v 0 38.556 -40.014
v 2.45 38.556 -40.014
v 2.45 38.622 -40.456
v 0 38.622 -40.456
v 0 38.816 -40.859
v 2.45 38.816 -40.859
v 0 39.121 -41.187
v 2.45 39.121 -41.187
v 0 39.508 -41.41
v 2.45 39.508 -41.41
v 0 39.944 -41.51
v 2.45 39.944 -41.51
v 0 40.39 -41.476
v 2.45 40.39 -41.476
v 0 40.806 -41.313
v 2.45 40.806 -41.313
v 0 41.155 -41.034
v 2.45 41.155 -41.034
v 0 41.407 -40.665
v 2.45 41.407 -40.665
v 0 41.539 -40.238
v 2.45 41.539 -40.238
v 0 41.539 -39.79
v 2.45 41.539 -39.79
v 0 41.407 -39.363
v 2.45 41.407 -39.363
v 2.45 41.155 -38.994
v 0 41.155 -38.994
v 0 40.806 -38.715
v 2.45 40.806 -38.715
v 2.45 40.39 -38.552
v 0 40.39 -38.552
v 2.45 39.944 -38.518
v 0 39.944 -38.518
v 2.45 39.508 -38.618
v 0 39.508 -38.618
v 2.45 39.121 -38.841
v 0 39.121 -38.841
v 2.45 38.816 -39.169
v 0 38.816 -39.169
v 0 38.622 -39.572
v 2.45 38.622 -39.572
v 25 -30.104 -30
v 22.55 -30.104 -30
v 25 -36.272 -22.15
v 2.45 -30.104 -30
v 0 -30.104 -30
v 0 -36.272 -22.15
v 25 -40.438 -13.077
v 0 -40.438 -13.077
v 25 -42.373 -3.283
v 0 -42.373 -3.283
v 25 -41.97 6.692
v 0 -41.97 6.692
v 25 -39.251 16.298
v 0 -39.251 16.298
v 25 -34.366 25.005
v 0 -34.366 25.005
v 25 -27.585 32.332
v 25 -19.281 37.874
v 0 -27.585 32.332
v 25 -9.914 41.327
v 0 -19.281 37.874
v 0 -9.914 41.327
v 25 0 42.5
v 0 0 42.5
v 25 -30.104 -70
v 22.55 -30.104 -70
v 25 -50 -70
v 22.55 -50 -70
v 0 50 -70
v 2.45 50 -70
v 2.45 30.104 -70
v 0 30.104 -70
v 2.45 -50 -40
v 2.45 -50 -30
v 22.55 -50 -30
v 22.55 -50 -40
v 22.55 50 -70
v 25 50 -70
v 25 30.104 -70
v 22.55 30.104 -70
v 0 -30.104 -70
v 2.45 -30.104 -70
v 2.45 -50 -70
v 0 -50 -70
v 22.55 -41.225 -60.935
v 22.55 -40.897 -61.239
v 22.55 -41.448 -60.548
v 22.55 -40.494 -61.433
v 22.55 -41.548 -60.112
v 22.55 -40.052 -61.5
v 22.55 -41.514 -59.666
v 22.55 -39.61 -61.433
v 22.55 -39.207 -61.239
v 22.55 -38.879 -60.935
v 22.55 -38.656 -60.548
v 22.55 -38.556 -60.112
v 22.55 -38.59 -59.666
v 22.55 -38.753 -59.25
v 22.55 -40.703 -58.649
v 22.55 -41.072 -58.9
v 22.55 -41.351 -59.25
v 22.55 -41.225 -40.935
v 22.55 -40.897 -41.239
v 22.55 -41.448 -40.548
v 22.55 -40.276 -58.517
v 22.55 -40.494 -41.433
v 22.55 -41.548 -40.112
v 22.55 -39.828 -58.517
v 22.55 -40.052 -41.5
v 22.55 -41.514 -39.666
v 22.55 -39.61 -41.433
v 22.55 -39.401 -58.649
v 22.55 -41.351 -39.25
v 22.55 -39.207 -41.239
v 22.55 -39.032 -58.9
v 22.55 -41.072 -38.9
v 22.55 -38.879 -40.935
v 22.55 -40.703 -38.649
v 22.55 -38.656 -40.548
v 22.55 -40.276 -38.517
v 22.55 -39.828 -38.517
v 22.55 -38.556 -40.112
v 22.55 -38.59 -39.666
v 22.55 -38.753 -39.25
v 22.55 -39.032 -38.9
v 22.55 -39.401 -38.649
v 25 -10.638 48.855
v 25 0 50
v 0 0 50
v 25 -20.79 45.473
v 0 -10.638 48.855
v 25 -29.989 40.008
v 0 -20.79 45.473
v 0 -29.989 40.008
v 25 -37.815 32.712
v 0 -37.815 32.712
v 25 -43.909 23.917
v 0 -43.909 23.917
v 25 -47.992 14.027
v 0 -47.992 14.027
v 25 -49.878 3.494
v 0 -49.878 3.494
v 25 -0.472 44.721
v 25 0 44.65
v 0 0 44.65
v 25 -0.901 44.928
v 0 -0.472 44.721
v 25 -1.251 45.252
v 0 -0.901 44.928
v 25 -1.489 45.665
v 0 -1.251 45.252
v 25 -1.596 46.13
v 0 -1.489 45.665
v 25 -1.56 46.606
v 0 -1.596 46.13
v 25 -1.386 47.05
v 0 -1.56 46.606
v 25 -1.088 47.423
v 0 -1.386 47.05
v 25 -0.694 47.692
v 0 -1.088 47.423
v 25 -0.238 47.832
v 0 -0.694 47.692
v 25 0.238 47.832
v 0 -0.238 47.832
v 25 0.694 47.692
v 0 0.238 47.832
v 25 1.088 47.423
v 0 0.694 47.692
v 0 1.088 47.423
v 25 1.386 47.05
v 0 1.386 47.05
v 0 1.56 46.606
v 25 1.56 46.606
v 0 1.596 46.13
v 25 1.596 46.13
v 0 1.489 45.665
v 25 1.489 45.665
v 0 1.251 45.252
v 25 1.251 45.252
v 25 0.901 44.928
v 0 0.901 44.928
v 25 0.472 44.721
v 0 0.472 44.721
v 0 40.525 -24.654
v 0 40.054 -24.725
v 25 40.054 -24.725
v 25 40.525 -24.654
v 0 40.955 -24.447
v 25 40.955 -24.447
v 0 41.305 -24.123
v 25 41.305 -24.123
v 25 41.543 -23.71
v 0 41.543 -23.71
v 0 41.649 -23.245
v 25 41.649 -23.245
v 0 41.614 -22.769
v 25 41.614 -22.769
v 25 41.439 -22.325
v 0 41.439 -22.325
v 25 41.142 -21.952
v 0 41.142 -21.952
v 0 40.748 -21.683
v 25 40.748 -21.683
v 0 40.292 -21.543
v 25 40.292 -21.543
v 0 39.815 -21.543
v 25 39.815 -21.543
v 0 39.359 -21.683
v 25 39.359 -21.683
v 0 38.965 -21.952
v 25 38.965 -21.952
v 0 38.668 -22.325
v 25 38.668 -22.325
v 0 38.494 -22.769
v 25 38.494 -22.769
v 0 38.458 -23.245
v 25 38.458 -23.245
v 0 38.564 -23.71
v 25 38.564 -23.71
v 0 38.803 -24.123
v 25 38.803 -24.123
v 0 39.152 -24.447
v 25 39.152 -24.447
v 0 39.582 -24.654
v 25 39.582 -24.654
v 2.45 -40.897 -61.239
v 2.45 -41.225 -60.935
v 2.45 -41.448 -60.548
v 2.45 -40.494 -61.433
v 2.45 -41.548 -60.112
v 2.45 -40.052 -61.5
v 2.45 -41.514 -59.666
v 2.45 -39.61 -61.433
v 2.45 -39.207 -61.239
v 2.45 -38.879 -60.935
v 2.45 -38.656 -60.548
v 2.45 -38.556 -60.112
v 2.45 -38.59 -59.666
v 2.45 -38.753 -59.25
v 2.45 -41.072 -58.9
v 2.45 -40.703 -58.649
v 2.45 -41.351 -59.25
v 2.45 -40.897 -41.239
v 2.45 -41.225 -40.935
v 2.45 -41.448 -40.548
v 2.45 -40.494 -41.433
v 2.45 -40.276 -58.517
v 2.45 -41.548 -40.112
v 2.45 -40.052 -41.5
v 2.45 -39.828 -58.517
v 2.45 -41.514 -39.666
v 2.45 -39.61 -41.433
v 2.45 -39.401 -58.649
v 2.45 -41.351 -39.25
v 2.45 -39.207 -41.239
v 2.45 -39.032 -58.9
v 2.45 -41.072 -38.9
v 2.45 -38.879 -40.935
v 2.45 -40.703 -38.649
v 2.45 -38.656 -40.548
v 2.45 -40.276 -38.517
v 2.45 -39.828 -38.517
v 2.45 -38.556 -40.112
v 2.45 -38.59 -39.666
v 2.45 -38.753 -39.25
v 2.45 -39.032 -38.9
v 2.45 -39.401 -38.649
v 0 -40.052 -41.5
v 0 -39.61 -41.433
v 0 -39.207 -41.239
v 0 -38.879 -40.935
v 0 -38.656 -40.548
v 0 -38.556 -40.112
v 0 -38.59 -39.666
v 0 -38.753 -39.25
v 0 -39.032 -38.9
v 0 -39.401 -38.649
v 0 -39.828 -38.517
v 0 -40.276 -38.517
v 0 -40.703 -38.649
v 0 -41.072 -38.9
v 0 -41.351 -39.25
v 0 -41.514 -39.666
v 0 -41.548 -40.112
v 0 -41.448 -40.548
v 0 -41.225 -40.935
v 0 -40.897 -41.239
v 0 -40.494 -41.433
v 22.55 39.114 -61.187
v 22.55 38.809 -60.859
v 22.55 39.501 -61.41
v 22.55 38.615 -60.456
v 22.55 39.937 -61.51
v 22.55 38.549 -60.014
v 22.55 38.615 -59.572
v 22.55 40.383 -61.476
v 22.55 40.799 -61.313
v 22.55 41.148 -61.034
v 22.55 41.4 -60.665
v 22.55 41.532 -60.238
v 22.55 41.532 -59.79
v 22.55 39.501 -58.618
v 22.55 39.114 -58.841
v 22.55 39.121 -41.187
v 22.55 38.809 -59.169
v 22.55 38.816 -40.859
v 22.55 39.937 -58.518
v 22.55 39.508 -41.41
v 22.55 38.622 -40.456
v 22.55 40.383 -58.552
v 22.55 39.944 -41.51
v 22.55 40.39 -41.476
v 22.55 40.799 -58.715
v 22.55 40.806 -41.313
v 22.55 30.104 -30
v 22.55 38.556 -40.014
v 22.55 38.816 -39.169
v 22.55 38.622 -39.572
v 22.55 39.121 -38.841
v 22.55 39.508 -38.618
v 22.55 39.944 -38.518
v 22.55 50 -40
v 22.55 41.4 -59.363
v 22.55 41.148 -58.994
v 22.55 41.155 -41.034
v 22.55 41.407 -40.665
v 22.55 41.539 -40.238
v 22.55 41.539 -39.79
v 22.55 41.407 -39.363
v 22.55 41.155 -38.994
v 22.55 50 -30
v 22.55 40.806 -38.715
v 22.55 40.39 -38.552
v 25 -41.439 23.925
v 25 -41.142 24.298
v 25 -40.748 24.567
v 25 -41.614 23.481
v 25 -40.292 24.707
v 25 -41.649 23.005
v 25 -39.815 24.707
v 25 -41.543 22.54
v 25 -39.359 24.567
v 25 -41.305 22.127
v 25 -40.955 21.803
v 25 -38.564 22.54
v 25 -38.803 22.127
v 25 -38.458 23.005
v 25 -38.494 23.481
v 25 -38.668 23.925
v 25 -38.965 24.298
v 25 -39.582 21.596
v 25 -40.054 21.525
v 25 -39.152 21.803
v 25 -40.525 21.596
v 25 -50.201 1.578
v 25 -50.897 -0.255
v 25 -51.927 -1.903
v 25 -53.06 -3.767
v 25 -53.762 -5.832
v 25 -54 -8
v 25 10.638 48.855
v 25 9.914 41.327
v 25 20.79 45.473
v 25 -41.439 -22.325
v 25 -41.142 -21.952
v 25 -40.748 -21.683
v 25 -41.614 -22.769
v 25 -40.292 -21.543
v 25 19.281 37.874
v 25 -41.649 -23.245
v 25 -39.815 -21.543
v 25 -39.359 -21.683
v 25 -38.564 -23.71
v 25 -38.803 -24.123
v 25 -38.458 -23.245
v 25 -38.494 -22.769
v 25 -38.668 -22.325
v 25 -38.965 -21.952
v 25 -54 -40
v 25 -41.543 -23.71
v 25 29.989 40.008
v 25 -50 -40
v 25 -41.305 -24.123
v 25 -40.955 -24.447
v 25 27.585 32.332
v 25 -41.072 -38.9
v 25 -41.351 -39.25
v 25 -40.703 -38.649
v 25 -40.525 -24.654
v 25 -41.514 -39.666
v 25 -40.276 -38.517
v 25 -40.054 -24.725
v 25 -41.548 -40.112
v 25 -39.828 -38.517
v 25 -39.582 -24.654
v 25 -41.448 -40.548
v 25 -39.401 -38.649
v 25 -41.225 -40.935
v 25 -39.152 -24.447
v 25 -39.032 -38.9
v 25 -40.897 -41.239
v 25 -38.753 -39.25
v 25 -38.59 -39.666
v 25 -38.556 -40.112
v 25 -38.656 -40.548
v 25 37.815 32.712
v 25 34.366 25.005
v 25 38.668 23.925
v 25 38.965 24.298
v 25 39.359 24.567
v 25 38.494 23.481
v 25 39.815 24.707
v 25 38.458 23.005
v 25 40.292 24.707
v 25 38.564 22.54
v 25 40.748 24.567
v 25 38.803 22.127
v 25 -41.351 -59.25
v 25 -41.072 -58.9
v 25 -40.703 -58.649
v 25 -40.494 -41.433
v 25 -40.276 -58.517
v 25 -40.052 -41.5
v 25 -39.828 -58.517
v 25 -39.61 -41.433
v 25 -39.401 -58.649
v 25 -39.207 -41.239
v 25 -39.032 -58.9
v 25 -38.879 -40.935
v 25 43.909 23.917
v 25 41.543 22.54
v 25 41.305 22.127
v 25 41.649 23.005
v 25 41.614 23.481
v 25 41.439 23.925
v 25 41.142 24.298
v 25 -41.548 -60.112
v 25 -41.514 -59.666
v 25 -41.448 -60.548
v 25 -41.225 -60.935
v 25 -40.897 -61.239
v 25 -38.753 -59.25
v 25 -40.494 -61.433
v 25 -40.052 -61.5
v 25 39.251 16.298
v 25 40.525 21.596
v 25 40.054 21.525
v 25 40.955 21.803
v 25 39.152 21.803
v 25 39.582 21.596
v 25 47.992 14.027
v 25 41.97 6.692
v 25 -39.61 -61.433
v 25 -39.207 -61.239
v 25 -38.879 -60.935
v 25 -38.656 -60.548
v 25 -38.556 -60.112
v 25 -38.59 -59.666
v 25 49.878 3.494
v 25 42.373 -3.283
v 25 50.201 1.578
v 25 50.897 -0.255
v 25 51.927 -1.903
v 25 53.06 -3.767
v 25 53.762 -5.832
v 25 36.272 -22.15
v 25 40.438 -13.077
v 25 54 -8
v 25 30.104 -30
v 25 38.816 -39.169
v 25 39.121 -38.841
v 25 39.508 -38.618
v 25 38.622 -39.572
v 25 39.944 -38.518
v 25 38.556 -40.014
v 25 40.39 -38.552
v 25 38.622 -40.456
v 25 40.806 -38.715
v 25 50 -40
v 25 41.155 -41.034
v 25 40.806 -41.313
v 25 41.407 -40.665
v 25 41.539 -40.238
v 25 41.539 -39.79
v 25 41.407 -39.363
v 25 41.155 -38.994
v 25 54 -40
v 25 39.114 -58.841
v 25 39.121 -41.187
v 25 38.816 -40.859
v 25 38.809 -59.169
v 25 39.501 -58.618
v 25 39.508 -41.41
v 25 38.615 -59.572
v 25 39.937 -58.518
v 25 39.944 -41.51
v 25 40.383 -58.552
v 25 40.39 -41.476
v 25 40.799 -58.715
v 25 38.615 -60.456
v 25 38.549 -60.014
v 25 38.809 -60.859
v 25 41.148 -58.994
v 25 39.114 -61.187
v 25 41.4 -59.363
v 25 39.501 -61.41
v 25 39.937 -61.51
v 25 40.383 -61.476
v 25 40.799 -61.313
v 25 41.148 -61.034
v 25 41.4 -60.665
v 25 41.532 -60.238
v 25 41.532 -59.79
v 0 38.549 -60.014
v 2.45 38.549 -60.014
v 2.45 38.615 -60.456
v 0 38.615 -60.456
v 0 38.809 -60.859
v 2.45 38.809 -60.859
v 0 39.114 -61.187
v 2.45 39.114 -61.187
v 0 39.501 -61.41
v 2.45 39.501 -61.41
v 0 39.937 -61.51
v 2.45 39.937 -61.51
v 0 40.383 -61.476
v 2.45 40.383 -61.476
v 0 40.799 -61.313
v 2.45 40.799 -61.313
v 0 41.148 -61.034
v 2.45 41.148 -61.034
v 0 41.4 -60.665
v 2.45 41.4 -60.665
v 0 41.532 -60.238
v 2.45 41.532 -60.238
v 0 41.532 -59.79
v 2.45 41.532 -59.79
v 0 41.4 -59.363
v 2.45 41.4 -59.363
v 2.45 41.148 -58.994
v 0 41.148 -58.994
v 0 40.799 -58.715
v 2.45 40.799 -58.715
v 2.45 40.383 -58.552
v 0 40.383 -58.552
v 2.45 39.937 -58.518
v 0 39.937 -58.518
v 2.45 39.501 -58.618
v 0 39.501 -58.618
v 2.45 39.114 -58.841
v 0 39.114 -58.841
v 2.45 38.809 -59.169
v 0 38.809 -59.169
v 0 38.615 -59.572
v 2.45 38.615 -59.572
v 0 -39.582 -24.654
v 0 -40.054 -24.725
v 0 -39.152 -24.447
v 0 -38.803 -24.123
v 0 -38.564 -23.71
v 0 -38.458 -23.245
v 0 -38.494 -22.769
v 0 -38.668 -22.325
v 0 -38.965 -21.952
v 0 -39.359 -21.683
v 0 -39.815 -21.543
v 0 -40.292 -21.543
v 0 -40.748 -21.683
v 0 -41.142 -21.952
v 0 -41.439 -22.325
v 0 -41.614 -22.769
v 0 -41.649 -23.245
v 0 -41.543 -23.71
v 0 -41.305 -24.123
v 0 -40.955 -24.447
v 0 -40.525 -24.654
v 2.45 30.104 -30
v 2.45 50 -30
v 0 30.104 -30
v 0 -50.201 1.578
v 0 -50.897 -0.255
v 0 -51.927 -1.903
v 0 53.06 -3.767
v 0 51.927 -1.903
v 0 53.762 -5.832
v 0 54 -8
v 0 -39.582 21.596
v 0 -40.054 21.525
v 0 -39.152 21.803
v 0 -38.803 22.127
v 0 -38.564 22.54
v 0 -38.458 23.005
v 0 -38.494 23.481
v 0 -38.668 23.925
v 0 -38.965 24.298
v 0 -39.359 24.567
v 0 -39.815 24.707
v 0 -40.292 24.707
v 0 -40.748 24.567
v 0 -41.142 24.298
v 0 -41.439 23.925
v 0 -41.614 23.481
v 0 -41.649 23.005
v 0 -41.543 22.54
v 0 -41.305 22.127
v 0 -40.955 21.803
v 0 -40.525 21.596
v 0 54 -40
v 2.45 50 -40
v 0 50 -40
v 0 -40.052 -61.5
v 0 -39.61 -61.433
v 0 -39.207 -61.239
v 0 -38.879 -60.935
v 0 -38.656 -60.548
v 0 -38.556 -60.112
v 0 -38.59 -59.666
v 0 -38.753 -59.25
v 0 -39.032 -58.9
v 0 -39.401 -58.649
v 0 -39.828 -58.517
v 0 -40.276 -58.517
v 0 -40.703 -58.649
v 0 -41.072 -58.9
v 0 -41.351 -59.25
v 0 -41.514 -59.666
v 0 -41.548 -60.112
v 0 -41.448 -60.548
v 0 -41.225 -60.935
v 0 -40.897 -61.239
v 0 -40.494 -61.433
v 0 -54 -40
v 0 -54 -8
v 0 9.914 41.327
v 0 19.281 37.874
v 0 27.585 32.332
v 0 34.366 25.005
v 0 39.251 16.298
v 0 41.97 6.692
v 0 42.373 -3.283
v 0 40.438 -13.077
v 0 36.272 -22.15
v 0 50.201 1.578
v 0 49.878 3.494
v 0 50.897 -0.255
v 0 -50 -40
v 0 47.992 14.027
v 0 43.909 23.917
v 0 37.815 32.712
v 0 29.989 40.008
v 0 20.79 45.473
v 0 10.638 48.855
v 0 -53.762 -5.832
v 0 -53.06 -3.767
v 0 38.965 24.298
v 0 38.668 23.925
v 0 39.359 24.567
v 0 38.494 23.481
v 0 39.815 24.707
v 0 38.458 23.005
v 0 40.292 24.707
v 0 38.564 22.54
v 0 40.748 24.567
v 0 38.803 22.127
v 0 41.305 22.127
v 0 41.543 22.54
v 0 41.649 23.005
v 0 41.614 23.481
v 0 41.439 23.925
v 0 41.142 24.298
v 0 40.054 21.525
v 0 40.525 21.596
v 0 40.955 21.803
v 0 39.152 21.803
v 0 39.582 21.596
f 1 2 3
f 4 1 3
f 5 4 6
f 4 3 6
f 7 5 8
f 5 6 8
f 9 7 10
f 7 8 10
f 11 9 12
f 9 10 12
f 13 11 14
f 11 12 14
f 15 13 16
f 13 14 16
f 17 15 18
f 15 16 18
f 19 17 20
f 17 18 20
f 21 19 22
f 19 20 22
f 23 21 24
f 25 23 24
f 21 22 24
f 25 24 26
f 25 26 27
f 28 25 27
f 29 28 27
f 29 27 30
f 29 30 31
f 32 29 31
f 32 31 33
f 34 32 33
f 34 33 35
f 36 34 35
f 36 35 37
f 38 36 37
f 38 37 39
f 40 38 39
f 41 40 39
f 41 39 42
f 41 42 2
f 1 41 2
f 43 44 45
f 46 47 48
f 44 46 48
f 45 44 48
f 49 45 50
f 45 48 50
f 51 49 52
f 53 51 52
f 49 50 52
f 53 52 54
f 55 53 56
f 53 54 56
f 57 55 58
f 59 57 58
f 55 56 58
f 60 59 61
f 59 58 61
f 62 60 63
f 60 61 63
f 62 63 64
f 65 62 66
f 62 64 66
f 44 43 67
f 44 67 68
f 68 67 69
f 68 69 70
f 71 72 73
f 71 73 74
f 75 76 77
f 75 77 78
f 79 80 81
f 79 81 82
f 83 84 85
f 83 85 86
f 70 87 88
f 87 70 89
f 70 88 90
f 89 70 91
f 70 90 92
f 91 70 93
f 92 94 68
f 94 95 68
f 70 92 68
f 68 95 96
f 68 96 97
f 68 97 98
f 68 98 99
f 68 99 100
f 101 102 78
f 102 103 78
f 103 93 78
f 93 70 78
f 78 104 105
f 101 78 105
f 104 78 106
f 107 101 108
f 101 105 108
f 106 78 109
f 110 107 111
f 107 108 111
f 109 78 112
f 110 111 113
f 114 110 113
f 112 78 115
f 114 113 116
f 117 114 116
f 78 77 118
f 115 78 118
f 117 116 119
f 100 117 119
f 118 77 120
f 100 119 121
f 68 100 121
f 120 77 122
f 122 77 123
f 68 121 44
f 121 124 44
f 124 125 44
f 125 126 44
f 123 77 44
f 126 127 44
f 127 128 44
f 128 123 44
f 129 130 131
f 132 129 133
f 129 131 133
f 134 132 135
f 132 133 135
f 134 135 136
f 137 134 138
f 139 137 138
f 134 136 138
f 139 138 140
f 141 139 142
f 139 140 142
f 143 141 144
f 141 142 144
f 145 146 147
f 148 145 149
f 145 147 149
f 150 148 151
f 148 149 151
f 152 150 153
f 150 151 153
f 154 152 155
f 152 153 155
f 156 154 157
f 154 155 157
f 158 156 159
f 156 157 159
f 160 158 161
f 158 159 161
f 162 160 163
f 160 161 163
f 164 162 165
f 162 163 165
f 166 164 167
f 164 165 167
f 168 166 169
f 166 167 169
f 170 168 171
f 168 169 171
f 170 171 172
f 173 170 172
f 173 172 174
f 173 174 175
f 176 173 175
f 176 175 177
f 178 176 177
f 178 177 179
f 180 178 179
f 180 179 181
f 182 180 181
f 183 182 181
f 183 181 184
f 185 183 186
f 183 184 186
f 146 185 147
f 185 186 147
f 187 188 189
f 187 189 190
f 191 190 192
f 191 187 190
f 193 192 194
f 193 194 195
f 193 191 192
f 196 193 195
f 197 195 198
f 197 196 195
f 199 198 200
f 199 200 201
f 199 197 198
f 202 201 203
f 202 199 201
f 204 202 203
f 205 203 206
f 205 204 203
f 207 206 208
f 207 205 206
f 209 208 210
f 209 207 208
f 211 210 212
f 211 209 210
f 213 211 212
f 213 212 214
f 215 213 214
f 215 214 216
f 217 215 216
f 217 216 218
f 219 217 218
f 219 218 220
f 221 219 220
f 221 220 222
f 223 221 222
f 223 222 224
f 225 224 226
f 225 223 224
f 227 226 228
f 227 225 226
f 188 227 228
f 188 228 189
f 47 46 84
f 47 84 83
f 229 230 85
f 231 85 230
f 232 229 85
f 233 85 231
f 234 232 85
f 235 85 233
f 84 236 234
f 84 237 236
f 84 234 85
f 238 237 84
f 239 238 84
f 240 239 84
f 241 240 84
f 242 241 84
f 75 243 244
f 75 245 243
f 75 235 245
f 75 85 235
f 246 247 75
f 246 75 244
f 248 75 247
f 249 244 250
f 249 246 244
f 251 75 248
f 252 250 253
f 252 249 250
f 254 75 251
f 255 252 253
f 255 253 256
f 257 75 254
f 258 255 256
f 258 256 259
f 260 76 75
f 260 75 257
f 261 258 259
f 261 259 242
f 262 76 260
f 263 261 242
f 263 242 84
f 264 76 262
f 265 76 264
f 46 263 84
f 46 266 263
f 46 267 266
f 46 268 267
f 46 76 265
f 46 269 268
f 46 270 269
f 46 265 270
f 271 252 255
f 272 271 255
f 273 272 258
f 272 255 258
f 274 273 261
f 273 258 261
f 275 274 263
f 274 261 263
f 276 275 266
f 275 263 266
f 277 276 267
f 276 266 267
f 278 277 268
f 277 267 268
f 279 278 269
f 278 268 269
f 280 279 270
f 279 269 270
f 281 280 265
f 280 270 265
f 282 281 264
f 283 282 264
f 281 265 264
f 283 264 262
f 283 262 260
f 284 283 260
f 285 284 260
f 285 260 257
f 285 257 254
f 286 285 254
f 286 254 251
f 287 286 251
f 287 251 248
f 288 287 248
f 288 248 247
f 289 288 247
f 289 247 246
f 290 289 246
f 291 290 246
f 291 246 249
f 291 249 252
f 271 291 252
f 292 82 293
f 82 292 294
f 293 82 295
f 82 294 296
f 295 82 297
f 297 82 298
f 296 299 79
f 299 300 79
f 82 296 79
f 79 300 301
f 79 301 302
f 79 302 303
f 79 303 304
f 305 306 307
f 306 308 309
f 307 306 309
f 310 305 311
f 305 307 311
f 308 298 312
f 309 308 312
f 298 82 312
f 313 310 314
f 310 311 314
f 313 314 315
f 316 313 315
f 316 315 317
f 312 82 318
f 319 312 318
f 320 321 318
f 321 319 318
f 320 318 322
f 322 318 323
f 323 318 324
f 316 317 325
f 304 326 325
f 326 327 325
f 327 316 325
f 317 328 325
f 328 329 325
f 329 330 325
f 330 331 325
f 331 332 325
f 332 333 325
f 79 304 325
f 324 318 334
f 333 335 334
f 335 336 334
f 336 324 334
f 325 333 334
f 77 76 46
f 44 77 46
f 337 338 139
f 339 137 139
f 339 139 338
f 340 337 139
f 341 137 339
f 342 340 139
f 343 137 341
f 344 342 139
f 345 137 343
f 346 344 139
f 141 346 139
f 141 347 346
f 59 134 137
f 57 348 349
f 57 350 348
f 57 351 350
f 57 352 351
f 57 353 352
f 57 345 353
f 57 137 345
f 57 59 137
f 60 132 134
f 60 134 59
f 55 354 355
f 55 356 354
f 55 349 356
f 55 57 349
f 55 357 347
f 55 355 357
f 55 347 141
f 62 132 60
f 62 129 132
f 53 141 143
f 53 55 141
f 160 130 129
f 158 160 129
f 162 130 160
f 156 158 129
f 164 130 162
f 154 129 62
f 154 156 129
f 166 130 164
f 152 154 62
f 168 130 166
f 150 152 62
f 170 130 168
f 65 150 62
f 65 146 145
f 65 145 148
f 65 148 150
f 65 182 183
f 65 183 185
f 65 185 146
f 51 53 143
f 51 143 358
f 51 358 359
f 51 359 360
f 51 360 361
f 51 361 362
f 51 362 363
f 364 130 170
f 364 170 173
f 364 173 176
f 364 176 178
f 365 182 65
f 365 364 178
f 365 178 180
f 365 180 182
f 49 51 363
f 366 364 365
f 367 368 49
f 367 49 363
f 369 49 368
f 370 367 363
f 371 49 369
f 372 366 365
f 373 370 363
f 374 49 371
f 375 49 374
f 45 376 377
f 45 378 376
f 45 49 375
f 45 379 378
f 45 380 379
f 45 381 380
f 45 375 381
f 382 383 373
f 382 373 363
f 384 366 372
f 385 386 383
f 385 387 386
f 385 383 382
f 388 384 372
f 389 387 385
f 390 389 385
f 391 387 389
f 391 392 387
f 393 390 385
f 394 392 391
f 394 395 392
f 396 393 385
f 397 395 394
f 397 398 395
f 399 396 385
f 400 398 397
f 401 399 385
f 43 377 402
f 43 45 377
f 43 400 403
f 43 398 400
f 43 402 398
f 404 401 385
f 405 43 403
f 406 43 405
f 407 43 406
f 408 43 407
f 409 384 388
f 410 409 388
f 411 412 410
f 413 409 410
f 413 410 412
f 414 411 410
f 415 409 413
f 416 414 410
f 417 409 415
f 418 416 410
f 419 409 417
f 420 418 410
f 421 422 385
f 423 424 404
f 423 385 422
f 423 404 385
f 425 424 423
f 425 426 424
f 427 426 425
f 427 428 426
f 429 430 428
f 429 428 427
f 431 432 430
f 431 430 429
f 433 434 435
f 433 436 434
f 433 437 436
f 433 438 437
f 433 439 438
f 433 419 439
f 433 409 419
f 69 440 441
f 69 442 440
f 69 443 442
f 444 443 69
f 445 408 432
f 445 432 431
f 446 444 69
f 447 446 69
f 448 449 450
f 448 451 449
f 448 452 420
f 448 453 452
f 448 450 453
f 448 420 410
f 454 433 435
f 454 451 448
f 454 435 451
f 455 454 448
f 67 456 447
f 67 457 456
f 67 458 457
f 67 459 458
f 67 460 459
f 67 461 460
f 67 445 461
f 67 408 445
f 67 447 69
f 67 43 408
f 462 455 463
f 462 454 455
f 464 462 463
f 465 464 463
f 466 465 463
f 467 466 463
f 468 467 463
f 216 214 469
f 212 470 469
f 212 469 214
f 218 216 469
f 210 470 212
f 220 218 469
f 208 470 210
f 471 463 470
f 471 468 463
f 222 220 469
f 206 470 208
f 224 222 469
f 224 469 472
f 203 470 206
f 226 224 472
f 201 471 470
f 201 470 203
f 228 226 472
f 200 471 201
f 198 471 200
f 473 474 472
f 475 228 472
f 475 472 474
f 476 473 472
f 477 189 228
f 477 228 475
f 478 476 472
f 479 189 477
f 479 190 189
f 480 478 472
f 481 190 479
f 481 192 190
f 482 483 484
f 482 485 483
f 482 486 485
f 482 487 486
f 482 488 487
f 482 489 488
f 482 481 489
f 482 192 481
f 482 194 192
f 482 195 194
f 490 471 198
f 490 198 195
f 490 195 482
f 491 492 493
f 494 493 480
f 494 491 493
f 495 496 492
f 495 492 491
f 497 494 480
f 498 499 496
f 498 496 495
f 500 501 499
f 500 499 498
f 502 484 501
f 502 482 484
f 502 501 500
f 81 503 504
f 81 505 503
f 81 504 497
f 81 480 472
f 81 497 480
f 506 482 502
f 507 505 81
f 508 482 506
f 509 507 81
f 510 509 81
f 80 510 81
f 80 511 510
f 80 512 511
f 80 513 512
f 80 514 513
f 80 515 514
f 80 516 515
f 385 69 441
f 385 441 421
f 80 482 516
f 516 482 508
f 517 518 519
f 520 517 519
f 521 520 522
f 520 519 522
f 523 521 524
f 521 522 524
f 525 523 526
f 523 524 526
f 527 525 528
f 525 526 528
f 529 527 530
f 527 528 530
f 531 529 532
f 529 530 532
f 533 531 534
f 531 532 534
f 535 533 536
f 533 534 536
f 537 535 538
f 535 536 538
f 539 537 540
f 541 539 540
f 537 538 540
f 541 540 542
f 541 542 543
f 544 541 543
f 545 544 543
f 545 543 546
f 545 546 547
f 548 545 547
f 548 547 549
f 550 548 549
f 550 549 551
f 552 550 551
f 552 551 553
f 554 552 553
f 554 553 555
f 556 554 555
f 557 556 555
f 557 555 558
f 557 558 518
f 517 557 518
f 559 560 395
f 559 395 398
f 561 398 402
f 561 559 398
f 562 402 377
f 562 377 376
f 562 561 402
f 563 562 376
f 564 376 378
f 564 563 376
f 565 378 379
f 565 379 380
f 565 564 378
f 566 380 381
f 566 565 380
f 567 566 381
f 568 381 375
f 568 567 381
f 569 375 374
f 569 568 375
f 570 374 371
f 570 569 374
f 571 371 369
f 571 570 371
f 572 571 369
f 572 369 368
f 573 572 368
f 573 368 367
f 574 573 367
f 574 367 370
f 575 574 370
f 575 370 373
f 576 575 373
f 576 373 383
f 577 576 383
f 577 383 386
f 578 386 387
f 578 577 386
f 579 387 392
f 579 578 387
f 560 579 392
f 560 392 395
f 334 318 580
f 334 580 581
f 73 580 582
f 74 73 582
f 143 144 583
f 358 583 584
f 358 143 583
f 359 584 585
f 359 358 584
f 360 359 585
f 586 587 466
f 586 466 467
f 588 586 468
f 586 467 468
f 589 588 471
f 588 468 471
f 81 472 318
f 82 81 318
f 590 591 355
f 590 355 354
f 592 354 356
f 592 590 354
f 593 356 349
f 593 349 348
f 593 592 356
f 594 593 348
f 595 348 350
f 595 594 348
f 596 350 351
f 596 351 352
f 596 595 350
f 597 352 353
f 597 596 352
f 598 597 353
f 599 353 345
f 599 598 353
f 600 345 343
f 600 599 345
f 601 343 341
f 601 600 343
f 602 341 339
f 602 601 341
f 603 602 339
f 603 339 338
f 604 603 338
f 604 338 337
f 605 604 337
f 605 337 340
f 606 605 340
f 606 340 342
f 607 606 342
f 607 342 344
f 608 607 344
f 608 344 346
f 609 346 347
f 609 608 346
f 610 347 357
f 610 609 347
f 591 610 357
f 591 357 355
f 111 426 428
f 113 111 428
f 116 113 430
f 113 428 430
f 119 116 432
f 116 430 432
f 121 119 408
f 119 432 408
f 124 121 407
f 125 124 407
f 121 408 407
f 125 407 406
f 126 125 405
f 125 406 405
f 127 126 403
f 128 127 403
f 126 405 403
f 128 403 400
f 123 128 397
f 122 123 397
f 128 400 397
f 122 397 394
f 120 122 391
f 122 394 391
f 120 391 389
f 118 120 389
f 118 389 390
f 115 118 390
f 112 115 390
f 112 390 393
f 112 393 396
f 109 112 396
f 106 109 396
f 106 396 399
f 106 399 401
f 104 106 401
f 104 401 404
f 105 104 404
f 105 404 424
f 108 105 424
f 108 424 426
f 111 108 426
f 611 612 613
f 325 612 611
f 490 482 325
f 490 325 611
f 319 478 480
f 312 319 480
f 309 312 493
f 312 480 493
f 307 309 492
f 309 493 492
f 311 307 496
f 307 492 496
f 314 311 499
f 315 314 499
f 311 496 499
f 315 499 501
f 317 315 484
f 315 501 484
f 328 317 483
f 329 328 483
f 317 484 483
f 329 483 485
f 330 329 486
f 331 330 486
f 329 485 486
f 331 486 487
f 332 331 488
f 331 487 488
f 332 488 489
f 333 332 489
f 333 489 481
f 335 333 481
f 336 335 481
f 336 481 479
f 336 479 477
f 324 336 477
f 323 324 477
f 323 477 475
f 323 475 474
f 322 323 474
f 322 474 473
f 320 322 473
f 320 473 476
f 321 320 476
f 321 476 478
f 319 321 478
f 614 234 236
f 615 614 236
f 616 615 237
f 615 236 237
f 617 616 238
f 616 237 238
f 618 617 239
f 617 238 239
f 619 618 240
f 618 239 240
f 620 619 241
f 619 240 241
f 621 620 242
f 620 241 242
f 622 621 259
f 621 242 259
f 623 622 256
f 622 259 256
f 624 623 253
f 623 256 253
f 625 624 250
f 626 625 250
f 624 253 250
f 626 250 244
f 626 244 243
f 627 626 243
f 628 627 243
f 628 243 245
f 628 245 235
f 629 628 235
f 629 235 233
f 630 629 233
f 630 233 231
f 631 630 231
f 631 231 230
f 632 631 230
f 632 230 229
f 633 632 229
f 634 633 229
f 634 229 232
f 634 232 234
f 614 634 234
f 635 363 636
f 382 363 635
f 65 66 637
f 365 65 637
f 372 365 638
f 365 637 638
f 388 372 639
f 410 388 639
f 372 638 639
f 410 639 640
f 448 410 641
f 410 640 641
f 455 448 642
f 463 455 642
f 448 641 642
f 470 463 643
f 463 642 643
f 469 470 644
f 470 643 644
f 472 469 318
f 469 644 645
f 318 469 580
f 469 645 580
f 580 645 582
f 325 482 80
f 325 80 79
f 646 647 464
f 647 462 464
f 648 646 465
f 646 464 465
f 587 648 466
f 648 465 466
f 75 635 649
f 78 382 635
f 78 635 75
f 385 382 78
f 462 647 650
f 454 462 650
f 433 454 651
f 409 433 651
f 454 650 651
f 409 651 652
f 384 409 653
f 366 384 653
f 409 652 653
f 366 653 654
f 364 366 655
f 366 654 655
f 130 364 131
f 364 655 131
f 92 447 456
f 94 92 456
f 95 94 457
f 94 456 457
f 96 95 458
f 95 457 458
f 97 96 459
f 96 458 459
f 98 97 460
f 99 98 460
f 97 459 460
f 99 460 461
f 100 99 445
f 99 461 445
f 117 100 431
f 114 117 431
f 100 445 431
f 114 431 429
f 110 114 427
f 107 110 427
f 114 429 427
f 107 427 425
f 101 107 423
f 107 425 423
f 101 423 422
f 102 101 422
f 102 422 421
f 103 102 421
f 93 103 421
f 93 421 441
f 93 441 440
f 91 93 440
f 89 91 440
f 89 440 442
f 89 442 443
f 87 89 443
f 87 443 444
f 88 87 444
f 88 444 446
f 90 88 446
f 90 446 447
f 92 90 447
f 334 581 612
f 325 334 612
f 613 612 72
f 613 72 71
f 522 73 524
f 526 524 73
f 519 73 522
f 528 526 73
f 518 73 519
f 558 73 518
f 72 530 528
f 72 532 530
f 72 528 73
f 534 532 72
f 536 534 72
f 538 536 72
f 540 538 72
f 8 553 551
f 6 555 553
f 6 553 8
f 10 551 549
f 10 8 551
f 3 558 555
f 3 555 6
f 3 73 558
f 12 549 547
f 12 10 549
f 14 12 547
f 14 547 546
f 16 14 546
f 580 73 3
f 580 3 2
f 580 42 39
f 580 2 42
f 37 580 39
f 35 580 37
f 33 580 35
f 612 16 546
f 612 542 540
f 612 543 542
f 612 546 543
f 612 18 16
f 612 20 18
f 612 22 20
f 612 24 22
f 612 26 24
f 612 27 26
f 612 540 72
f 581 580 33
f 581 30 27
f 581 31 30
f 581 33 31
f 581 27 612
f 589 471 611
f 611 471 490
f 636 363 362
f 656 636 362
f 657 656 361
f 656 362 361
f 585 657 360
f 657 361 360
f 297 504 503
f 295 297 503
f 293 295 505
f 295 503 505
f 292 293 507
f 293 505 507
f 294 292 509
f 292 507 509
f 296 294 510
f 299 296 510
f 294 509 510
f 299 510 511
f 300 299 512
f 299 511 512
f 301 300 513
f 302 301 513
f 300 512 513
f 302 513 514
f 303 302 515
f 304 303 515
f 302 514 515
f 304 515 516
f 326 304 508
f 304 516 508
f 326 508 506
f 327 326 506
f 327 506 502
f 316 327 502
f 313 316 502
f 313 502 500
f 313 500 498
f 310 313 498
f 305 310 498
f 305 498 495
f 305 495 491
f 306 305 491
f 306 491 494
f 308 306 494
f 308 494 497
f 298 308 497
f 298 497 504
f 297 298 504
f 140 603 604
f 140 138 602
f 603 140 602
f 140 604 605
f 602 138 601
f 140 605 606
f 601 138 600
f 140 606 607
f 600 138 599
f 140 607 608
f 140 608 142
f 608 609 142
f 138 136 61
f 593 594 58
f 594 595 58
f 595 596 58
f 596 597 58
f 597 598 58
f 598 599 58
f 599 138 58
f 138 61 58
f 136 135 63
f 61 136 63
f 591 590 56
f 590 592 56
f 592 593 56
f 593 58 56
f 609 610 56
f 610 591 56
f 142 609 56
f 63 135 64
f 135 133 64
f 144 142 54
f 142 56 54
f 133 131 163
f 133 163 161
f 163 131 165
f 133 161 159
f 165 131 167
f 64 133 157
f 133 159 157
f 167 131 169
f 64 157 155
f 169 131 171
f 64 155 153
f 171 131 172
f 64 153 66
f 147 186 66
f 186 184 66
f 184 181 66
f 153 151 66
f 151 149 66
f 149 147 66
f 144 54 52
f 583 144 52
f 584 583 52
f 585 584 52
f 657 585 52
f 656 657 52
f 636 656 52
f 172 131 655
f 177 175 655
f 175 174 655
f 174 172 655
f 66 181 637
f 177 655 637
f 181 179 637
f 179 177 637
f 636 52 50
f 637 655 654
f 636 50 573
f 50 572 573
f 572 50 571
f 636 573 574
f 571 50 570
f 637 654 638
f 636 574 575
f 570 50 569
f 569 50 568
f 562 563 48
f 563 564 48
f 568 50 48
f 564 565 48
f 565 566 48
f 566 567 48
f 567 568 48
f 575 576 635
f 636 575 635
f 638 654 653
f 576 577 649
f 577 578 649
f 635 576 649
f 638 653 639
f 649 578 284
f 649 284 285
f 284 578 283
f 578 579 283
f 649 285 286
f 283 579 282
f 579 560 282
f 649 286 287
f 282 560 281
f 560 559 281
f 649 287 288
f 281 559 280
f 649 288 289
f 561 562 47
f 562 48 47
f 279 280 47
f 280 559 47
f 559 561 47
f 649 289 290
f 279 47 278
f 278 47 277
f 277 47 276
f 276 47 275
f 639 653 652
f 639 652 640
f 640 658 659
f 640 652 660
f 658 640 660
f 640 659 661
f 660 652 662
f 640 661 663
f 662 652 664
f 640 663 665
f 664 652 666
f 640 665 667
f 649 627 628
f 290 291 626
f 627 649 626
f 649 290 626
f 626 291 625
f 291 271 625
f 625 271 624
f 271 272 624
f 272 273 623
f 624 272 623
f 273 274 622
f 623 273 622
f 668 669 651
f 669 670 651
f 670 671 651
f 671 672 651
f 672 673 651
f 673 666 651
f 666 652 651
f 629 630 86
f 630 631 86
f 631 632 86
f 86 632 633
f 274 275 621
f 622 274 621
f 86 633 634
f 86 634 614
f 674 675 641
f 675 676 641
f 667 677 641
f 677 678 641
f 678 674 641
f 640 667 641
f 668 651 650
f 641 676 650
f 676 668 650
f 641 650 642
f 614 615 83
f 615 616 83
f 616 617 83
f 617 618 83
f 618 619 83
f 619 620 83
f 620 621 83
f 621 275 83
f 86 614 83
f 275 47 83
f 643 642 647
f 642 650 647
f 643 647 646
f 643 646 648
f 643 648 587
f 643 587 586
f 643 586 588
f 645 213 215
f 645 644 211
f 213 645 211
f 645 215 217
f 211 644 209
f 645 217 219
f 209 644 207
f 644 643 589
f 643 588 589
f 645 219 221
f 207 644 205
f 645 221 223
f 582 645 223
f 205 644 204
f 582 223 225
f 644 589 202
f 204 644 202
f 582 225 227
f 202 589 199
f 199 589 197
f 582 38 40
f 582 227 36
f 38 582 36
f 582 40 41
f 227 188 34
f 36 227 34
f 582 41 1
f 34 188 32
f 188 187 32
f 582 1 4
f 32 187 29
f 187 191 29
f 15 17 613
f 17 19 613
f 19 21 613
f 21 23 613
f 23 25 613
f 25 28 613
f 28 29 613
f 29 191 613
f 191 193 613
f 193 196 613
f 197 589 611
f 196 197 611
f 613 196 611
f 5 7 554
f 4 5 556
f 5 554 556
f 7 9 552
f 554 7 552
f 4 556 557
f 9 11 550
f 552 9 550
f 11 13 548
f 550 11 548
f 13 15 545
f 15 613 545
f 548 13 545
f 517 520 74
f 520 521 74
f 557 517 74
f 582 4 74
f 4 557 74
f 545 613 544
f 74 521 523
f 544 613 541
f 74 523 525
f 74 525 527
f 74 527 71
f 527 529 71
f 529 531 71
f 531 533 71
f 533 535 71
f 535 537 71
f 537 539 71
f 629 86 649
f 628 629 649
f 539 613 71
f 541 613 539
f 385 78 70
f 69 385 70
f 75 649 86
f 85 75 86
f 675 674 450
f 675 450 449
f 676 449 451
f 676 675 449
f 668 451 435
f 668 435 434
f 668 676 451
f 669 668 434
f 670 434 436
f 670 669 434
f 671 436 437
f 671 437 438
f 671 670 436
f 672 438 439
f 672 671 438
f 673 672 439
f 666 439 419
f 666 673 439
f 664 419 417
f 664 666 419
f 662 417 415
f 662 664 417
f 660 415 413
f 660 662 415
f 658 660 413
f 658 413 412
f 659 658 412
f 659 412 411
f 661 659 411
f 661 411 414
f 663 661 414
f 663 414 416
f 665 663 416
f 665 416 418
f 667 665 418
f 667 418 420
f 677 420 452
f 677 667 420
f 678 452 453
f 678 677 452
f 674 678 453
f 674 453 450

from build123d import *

# Parameters (mm, degrees)
SKETCH_1_R          = 1.6
EXTRUDE_1_DEPTH     = 25
SKETCH_2_W          = 2.45
SKETCH_2_H          = 19.896013553
EXTRUDE_2_DEPTH     = 40
SKETCH_3_R          = 1.5
CUT_EXTRUDE_1_DEPTH = 90.582364336
SKETCH_4_W          = 40
SKETCH_4_H          = 4
EXTRUDE_3_DEPTH     = 25
FILLET_4_R          = 10
FILLET_5_R          = 10


with BuildPart() as part:
    # 草图1 → 凸台-拉伸1 (new body)
    # profile 1 of 2: a face of its own
    with BuildSketch(Plane(origin=(0, 0, 0), x_dir=(0, 0, -1), z_dir=(1, 0, 0))):
        with BuildLine():
            ThreePointArc((-47.85, 0), (-46.25, 1.6), (-44.65, 0))
            Line((-44.65, 0), (-42.5, 0))
            ThreePointArc((-42.5, 0), (-16.298006013, 39.25079617), (30, 30.103986447))
            Line((30, 30.103986447), (30, 50))
            Line((30, 50), (0, 50))
            ThreePointArc((0, 50), (-35.355339059, 35.355339059), (-50, 0))
            Line((-50, 0), (-47.85, 0))
        make_face()
        with Locations((-23.125, 40.053674925)):
            Circle(SKETCH_1_R, mode=Mode.SUBTRACT)
        with Locations((23.125, 40.053674925)):
            Circle(SKETCH_1_R, mode=Mode.SUBTRACT)
    # profile 2 of 2: a face of its own
    with BuildSketch(Plane(origin=(0, 0, 0), x_dir=(0, 0, -1), z_dir=(1, 0, 0))):
        with BuildLine():
            Line((-42.5, 0), (-44.65, 0))
            ThreePointArc((-44.65, 0), (-46.25, -1.6), (-47.85, 0))
            Line((-47.85, 0), (-50, 0))
            ThreePointArc((-50, 0), (-35.355339059, -35.355339059), (0, -50))
            Line((0, -50), (30, -50))
            Line((30, -50), (30, -30.103986447))
            ThreePointArc((30, -30.103986447), (-16.298006013, -39.25079617), (-42.5, 0))
        make_face()
        with Locations((-23.125, -40.053674925)):
            Circle(SKETCH_1_R, mode=Mode.SUBTRACT)
        with Locations((23.125, -40.053674925)):
            Circle(SKETCH_1_R, mode=Mode.SUBTRACT)
    extrude(amount=EXTRUDE_1_DEPTH)

    # 草图2 → 凸台-拉伸2 (add)
    with BuildSketch(Plane(origin=(0, 0, -30), x_dir=(-1, 0, 0), z_dir=(0, 0, -1))):
        with Locations((-23.775, 40.051993223)):
            Rectangle(SKETCH_2_W, SKETCH_2_H)
        with Locations((-1.225, 40.051993223)):
            Rectangle(SKETCH_2_W, SKETCH_2_H)
        with Locations((-1.225, -40.051993223)):
            Rectangle(SKETCH_2_W, SKETCH_2_H)
        with Locations((-23.775, -40.051993223)):
            Rectangle(SKETCH_2_W, SKETCH_2_H)
    extrude(amount=EXTRUDE_2_DEPTH)

    # 草图3 → 切除-拉伸1 (cut, through all)
    with BuildSketch(Plane(origin=(25, 0, 0), x_dir=(0, 0, -1), z_dir=(1, 0, 0))):
        with Locations((60, -40.051993223)):
            Circle(SKETCH_3_R)
        with Locations((40, -40.051993223)):
            Circle(SKETCH_3_R)
        with Locations(Location((40.013969679, 40.055824631, 0), (0, 0, 270))):
            Circle(SKETCH_3_R)
        with Locations(Location((60.013968462, 40.048849193, 0), (0, 0, 270))):
            Circle(SKETCH_3_R)
    extrude(amount=-CUT_EXTRUDE_1_DEPTH, mode=Mode.SUBTRACT)

    # 草图4 → 凸台-拉伸3 (add)
    with BuildSketch(Plane(origin=(25, 0, 0), x_dir=(0, 0, -1), z_dir=(1, 0, 0))):
        with Locations((20, 52)):
            Rectangle(SKETCH_4_W, SKETCH_4_H)
        with Locations((20, -52)):
            Rectangle(SKETCH_4_W, SKETCH_4_H)
    extrude(amount=-EXTRUDE_3_DEPTH)

    # 圆角4
    # the kernel refuses this fillet: 10 mm, written as the material it takes off along each edge
    with BuildSketch(Plane(origin=(45, -54, 0), x_dir=(0, 0, -1), z_dir=(-1, 0, 0))) as fillet_4_piece_1:
        with BuildLine():
            CenterArc((8, -10), FILLET_4_R, 90, 53.130102354)
            Line((0, -4), (-0.16, -3.88))
            ThreePointArc((-0.16, -3.88), (-0.2, -2), (-0.2, 0))
            Line((-0.2, 0), (0, 0.2))
            Line((0, 0.2), (8, 0.2))
            Line((8, 0.2), (8, 0))
        make_face()
    extrude(amount=65, mode=Mode.SUBTRACT)
    with BuildSketch(Plane(origin=(45, 54, 0), x_dir=(0, 0, -1), z_dir=(-1, 0, 0))) as fillet_4_piece_2:
        with BuildLine():
            CenterArc((8, 10), FILLET_4_R, 216.869897646, 53.130102354)
            Line((0, 4), (-0.16, 3.88))
            ThreePointArc((-0.16, 3.88), (-0.2, 2), (-0.2, 0))
            Line((-0.2, 0), (0, -0.2))
            Line((0, -0.2), (8, -0.2))
            Line((8, -0.2), (8, 0))
        make_face()
    extrude(amount=65, mode=Mode.SUBTRACT)

    # 圆角5
    fillet_5_edges = [part.edges().sort_by_distance(p)[0] for p in [
        (12.5, -50, 0),
        (12.5, 50, 0),
    ]]
    fillet(fillet_5_edges, radius=FILLET_5_R)


solid = part.part
